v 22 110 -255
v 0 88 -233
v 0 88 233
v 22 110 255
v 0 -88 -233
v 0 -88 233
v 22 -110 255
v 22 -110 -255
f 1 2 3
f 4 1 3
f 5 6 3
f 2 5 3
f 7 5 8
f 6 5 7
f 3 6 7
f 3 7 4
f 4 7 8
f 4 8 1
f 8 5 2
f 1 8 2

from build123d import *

# Parameters (mm, degrees)
F0_W     = 220
F0_H     = 510
F1_DEPTH = 22
F2_SIZE  = 21.99999


# Not quite as in the source:
# - a fillet or chamfer is up to 0.001 mm smaller than in the source, because OpenCascade refuses the exact size


with BuildPart() as f1:
    # F0 (on Right) → F1 (new body)
    with BuildSketch(Plane.YZ):
        Rectangle(F0_W, F0_H)
    extrude(amount=F1_DEPTH)

    # F2 (size 22 in the source; OpenCascade refuses exactly that, so slightly less here)
    f2_edges = [f1.edges().sort_by_distance(p)[0] for p in [
        (0, 0, 255),
        (0, 110, 0),
        (0, 0, -255),
        (0, -110, 0),
    ]]
    chamfer(f2_edges, length=F2_SIZE)


solid = f1.part
